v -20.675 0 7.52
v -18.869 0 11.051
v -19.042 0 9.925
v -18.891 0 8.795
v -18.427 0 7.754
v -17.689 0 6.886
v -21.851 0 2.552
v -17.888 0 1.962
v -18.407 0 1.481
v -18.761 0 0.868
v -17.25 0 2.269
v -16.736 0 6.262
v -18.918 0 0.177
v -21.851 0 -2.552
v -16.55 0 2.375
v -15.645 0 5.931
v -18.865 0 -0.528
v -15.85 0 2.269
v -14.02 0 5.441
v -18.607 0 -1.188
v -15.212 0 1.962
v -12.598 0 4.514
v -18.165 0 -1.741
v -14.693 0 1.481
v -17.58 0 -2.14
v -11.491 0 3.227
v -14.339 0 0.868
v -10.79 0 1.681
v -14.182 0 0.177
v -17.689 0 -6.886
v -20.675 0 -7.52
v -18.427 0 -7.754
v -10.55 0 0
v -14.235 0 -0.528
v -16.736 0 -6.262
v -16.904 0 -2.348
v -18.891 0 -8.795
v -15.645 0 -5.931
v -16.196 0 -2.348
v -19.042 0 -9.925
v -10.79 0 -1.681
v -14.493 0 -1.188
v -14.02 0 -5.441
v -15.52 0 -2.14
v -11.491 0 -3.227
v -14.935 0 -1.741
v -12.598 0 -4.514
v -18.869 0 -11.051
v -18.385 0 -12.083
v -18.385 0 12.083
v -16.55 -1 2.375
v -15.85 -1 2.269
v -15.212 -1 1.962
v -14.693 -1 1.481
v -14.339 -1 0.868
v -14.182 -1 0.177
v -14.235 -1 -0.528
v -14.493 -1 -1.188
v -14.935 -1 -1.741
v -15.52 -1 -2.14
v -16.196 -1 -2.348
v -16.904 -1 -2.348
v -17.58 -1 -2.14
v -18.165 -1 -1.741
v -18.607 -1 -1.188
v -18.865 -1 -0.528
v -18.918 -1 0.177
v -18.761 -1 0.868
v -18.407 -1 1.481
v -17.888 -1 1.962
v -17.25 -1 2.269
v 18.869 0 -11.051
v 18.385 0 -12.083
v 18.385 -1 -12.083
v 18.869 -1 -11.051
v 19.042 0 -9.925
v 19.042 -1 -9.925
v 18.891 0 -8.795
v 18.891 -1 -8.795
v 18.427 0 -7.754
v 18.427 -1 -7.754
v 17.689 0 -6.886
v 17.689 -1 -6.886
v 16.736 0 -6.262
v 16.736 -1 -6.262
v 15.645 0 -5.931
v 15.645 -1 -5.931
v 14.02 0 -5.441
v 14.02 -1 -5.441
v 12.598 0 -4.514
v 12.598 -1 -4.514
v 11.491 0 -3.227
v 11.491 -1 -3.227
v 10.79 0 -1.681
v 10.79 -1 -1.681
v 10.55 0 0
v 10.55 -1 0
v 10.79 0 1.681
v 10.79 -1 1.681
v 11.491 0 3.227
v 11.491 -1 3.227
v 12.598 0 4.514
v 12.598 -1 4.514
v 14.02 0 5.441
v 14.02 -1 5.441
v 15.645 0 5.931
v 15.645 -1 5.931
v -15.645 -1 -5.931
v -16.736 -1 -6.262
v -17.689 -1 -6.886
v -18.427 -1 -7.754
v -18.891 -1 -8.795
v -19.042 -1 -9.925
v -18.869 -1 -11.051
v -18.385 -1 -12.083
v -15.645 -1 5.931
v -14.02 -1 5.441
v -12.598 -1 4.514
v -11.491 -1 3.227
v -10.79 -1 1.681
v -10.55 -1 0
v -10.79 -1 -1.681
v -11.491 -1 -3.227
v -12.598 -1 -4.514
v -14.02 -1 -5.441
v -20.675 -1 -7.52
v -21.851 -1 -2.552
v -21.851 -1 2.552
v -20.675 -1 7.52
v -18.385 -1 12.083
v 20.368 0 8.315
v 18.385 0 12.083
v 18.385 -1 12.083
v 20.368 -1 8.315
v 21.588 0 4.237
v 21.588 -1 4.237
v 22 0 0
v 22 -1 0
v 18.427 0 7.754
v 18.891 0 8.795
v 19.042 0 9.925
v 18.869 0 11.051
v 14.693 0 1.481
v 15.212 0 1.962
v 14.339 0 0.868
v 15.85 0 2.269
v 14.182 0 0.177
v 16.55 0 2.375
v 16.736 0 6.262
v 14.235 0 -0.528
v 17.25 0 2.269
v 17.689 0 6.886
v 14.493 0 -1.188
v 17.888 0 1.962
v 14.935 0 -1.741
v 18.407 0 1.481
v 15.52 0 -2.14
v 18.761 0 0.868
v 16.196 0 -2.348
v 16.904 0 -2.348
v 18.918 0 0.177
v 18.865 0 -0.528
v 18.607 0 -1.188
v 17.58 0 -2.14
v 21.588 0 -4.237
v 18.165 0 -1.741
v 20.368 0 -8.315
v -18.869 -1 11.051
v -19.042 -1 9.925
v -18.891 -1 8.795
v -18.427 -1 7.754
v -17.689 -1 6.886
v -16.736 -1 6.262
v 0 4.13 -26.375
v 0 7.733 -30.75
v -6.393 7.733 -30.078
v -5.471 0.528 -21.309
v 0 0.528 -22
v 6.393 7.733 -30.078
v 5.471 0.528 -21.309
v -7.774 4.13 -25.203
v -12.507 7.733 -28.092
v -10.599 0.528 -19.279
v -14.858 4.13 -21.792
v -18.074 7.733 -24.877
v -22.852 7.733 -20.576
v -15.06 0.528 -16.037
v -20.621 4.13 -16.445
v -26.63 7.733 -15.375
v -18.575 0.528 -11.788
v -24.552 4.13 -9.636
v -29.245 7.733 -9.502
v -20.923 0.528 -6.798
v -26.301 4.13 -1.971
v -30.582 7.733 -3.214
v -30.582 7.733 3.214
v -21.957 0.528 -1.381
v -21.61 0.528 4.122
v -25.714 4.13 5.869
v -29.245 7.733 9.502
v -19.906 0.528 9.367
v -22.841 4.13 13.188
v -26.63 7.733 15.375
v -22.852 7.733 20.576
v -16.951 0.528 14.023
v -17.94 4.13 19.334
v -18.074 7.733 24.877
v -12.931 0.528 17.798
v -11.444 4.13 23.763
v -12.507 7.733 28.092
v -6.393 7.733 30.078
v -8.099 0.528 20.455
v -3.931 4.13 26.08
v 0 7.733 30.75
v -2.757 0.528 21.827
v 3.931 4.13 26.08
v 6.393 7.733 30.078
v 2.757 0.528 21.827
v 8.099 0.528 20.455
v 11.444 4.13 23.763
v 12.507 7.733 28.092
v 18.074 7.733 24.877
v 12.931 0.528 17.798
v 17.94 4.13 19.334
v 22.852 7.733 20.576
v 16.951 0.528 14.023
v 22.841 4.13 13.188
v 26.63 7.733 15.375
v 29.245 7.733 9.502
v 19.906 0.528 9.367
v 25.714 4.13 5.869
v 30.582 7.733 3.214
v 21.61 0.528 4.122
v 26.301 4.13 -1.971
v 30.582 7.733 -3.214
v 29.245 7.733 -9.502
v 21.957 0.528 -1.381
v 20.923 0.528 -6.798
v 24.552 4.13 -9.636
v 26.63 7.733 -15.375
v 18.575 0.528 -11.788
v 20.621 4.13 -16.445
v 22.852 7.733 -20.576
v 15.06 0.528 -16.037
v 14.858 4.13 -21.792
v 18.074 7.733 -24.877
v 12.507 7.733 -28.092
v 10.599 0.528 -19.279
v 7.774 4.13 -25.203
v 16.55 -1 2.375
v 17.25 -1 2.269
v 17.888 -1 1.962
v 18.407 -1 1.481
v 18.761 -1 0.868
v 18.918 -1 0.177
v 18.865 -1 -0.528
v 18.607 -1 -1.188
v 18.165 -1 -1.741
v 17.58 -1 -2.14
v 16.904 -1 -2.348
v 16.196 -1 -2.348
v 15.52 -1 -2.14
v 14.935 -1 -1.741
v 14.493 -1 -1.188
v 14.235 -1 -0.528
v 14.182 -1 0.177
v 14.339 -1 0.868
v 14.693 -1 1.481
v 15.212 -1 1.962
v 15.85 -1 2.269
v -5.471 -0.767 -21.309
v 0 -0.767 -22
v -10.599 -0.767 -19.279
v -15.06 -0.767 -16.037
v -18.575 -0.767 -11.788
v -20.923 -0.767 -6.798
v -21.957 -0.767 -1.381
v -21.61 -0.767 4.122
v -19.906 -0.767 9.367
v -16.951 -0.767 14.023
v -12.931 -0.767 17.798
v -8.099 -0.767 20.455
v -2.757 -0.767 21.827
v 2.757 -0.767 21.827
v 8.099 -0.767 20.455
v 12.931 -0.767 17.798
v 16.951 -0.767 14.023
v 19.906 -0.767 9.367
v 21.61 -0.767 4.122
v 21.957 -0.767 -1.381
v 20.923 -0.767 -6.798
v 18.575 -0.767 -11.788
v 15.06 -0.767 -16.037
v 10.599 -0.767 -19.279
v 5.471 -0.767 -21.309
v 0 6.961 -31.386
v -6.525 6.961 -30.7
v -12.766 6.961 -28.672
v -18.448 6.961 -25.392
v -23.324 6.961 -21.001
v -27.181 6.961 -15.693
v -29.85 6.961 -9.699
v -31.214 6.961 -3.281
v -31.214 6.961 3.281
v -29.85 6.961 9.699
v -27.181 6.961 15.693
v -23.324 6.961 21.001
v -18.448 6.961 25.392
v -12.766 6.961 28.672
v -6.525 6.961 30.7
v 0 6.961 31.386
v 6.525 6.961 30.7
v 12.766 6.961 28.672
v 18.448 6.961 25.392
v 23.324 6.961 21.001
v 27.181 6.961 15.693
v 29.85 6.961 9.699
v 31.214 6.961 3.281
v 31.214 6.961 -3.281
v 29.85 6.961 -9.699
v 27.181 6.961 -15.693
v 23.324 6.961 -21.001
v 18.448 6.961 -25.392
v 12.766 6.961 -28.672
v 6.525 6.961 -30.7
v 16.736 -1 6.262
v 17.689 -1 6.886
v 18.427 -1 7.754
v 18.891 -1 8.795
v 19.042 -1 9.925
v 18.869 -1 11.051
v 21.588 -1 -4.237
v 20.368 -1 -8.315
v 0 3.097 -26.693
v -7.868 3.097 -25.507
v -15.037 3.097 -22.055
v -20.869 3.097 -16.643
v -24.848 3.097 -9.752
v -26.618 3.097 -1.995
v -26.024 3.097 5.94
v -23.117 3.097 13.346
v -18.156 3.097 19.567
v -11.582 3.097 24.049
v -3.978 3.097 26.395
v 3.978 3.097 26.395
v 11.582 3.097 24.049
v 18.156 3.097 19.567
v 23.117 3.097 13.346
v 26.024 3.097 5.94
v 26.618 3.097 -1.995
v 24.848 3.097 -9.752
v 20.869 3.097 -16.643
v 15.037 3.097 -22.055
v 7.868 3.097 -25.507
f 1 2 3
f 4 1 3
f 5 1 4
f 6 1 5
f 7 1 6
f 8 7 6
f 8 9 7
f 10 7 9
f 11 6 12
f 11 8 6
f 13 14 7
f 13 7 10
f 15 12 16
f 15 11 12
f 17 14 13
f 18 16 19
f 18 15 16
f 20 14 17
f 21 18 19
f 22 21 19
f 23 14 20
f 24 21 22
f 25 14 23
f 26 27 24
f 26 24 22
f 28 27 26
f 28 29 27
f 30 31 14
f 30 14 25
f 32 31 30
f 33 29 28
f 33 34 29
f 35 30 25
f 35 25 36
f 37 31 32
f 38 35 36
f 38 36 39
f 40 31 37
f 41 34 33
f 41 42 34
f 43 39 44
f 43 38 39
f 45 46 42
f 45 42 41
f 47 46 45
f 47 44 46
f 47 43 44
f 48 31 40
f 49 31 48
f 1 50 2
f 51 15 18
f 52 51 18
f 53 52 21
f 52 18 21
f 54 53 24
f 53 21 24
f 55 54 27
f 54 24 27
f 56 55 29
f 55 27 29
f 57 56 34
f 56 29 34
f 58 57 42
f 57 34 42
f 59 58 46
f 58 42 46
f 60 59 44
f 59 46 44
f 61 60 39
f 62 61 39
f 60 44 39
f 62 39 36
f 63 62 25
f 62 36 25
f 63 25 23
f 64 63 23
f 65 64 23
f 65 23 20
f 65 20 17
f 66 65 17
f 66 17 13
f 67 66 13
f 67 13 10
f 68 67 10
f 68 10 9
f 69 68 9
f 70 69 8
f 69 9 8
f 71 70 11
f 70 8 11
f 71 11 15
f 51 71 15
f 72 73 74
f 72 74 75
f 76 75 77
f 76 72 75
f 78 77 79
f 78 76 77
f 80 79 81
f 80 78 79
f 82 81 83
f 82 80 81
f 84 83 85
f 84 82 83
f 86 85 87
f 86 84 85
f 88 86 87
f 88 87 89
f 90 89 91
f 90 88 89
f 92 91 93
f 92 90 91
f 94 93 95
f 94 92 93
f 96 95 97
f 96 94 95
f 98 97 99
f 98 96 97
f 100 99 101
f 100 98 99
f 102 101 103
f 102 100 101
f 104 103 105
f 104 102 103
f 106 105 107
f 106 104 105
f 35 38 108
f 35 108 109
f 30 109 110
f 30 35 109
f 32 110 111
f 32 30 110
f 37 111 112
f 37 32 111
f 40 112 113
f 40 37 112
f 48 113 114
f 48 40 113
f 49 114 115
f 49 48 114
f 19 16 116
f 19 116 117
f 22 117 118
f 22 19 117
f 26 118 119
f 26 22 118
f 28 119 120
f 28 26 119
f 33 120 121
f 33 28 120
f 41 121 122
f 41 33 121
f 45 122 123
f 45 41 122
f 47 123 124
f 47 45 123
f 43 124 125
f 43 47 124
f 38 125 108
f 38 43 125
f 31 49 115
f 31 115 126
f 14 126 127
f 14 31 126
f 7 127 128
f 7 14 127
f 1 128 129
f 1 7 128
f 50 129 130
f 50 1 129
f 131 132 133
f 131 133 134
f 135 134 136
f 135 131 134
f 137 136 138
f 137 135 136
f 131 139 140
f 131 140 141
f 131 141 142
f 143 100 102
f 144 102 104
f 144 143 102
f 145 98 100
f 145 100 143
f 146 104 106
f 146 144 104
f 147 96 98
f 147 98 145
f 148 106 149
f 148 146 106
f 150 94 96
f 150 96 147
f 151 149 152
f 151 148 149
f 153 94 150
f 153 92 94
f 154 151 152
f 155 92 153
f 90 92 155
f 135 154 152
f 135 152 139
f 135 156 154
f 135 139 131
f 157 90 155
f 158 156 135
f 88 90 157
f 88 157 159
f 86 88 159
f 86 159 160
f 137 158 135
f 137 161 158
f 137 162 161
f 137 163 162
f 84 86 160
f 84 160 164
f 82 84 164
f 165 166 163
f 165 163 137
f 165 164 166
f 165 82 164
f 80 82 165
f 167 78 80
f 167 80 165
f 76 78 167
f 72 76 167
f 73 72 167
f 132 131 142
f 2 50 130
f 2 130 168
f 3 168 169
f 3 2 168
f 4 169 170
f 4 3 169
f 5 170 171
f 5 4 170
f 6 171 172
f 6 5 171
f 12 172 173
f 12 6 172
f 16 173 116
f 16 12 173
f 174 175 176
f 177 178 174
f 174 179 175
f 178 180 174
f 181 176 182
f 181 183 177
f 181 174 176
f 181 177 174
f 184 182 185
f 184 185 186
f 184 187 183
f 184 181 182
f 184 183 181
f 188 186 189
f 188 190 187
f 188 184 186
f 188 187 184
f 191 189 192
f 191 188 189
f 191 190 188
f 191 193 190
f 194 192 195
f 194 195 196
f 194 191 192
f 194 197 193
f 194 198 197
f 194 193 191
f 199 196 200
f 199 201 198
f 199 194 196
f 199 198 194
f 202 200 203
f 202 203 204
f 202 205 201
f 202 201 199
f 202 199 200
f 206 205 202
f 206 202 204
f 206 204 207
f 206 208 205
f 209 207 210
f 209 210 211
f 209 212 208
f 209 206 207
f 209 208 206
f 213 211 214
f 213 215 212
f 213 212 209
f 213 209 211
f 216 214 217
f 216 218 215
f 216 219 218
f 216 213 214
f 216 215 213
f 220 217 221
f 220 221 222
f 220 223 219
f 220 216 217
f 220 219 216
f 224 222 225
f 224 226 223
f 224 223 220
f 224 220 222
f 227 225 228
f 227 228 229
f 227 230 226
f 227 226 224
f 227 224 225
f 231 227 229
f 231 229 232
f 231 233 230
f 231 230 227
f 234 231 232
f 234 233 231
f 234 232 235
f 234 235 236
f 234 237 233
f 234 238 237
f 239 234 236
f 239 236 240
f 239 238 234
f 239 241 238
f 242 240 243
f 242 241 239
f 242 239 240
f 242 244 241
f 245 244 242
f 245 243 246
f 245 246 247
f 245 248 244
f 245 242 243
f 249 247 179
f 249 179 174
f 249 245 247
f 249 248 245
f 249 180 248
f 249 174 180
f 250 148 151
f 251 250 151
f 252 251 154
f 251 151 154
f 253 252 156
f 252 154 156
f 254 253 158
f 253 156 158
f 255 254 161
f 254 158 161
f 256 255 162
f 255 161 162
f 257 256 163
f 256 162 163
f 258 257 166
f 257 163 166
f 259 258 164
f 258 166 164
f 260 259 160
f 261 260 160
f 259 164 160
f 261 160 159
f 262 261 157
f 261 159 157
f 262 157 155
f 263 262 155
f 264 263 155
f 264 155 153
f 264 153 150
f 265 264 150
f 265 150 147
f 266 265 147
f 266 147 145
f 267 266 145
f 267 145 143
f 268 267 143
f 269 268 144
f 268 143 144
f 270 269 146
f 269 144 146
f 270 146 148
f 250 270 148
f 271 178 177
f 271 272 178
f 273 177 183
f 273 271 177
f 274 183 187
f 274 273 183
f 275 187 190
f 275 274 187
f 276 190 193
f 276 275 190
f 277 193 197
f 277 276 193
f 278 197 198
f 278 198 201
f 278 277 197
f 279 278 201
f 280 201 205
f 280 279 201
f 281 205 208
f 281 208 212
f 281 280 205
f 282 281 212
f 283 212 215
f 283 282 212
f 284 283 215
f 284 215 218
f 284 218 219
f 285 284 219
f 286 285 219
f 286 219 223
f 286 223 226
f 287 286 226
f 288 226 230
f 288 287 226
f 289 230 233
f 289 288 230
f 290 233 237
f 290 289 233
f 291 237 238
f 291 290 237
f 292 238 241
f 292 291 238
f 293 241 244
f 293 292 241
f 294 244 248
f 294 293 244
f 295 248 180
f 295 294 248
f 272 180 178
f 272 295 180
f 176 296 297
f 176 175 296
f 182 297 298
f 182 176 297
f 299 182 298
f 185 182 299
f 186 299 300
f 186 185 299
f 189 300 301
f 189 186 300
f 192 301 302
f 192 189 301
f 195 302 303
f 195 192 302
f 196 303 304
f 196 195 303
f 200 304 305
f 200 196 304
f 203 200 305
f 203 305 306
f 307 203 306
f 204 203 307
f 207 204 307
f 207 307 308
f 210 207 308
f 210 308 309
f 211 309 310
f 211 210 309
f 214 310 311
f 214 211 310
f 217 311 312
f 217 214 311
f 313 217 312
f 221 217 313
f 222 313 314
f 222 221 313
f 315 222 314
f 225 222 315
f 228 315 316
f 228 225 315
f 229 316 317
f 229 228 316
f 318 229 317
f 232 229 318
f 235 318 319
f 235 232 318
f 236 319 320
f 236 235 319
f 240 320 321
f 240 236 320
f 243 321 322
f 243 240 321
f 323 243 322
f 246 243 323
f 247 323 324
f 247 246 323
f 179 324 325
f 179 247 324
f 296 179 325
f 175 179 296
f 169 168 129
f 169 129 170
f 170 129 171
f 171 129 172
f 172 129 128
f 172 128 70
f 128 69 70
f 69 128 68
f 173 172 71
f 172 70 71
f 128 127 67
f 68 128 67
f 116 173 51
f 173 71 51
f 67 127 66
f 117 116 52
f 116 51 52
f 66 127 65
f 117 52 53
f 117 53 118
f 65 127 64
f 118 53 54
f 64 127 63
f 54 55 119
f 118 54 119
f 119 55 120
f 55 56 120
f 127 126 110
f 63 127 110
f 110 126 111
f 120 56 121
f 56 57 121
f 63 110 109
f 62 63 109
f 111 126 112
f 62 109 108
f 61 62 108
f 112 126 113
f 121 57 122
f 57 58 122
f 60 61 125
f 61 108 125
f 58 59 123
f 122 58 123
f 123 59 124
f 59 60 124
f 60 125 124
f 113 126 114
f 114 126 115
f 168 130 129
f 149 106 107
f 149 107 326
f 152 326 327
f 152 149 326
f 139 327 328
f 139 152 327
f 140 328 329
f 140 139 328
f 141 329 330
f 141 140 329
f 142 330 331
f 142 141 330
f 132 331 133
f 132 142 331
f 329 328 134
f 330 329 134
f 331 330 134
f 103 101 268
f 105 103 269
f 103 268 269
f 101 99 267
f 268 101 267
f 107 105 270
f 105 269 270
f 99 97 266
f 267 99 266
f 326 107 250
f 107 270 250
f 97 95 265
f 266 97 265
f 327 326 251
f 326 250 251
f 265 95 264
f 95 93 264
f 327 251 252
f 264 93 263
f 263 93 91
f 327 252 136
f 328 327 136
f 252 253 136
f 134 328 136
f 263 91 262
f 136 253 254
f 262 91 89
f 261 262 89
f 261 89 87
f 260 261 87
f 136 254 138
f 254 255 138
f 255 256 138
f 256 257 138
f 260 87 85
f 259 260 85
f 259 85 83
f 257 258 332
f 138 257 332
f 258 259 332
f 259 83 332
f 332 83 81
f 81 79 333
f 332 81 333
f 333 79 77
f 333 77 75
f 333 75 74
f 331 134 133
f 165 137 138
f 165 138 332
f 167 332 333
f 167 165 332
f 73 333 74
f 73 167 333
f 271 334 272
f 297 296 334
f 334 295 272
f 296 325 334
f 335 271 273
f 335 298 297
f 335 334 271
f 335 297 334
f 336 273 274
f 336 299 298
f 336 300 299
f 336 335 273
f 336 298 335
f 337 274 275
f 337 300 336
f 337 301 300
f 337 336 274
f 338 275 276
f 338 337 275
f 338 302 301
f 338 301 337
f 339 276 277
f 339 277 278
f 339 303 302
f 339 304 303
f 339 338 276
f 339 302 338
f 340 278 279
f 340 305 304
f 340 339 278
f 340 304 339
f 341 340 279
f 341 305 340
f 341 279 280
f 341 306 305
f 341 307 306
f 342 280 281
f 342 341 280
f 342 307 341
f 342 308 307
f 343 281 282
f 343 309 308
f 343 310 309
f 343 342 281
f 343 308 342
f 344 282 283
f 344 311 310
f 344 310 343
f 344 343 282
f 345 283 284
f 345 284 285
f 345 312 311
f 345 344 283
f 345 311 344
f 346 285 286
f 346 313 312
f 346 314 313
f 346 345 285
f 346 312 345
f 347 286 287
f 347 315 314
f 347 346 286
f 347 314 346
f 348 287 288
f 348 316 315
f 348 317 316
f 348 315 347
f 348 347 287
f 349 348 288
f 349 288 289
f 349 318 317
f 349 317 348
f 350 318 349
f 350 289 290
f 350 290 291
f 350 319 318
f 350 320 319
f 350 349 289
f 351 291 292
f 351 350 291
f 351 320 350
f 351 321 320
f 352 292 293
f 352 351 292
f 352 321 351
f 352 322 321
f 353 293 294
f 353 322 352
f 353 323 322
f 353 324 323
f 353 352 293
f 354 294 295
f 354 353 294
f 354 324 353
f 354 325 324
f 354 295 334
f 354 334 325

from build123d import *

# Parameters (mm, degrees)
ESQUISSE2_R          = 2.375
BOSS_EXTRU_3_DEPTH   = 1
BOSS_EXTRU_3_2_DEPTH = 1


with BuildPart() as part:
    # Esquisse1 → Révolution1 (revolve)
    with BuildSketch(Plane(origin=(0, 0, 0), x_dir=(0, 0, -1), z_dir=(1, 0, 0)), mode=Mode.PRIVATE) as r_volution1_sk:
        Polygon((-22, -0.767223261), (-31.385641761, 6.960792574), (-30.75, 7.732776739), (-22, 0.528140096), align=None)
    revolve(r_volution1_sk.sketch.rotate(Axis((0, 0, 0), (0, 1, 0)), 180), axis=Axis((0, 0, 0), (0, 1, 0)))


with BuildPart() as body_2:
    # Esquisse2 → Boss.-Extru.3 (new body)
    with BuildSketch(Plane(origin=(0, 0, 0), x_dir=(1, 0, 0), z_dir=(0, 1, 0))):
        with BuildLine():
            ThreePointArc((-15.645422961, -5.931419761), (-10.55, 0), (-15.645422961, 5.931419761))
            ThreePointArc((-15.645422961, 5.931419761), (-18.696321447, 8.258232083), (-18.385120846, 12.082521735))
            ThreePointArc((-18.385120846, 12.082521735), (-22, 0), (-18.385120846, -12.082521735))
            ThreePointArc((-18.385120846, -12.082521735), (-18.696321447, -8.258232083), (-15.645422961, -5.931419761))
        make_face()
        with Locations(Location((-16.55, 0, 0), (0, 0, 270))):
            Circle(ESQUISSE2_R, mode=Mode.SUBTRACT)
    extrude(amount=-BOSS_EXTRU_3_DEPTH)


with BuildPart() as body_3:
    # Esquisse2 → Boss.-Extru.3 2 (new body)
    with BuildSketch(Plane(origin=(0, 0, 0), x_dir=(1, 0, 0), z_dir=(0, 1, 0))):
        with BuildLine():
            ThreePointArc((22, 0), (21.076914606, 6.30584417), (18.385120846, 12.082521735))
            ThreePointArc((18.385120846, 12.082521735), (18.696321447, 8.258232083), (15.645422961, 5.931419761))
            ThreePointArc((15.645422961, 5.931419761), (10.55, 0), (15.645422961, -5.931419761))
            ThreePointArc((15.645422961, -5.931419761), (18.696321447, -8.258232083), (18.385120846, -12.082521735))
            ThreePointArc((18.385120846, -12.082521735), (21.076914606, -6.30584417), (22, 0))
        make_face()
        with Locations(Location((16.55, 0, 0), (0, 0, 270))):
            Circle(ESQUISSE2_R, mode=Mode.SUBTRACT)
    extrude(amount=-BOSS_EXTRU_3_2_DEPTH)


solid = Compound([part.part, body_2.part, body_3.part])
